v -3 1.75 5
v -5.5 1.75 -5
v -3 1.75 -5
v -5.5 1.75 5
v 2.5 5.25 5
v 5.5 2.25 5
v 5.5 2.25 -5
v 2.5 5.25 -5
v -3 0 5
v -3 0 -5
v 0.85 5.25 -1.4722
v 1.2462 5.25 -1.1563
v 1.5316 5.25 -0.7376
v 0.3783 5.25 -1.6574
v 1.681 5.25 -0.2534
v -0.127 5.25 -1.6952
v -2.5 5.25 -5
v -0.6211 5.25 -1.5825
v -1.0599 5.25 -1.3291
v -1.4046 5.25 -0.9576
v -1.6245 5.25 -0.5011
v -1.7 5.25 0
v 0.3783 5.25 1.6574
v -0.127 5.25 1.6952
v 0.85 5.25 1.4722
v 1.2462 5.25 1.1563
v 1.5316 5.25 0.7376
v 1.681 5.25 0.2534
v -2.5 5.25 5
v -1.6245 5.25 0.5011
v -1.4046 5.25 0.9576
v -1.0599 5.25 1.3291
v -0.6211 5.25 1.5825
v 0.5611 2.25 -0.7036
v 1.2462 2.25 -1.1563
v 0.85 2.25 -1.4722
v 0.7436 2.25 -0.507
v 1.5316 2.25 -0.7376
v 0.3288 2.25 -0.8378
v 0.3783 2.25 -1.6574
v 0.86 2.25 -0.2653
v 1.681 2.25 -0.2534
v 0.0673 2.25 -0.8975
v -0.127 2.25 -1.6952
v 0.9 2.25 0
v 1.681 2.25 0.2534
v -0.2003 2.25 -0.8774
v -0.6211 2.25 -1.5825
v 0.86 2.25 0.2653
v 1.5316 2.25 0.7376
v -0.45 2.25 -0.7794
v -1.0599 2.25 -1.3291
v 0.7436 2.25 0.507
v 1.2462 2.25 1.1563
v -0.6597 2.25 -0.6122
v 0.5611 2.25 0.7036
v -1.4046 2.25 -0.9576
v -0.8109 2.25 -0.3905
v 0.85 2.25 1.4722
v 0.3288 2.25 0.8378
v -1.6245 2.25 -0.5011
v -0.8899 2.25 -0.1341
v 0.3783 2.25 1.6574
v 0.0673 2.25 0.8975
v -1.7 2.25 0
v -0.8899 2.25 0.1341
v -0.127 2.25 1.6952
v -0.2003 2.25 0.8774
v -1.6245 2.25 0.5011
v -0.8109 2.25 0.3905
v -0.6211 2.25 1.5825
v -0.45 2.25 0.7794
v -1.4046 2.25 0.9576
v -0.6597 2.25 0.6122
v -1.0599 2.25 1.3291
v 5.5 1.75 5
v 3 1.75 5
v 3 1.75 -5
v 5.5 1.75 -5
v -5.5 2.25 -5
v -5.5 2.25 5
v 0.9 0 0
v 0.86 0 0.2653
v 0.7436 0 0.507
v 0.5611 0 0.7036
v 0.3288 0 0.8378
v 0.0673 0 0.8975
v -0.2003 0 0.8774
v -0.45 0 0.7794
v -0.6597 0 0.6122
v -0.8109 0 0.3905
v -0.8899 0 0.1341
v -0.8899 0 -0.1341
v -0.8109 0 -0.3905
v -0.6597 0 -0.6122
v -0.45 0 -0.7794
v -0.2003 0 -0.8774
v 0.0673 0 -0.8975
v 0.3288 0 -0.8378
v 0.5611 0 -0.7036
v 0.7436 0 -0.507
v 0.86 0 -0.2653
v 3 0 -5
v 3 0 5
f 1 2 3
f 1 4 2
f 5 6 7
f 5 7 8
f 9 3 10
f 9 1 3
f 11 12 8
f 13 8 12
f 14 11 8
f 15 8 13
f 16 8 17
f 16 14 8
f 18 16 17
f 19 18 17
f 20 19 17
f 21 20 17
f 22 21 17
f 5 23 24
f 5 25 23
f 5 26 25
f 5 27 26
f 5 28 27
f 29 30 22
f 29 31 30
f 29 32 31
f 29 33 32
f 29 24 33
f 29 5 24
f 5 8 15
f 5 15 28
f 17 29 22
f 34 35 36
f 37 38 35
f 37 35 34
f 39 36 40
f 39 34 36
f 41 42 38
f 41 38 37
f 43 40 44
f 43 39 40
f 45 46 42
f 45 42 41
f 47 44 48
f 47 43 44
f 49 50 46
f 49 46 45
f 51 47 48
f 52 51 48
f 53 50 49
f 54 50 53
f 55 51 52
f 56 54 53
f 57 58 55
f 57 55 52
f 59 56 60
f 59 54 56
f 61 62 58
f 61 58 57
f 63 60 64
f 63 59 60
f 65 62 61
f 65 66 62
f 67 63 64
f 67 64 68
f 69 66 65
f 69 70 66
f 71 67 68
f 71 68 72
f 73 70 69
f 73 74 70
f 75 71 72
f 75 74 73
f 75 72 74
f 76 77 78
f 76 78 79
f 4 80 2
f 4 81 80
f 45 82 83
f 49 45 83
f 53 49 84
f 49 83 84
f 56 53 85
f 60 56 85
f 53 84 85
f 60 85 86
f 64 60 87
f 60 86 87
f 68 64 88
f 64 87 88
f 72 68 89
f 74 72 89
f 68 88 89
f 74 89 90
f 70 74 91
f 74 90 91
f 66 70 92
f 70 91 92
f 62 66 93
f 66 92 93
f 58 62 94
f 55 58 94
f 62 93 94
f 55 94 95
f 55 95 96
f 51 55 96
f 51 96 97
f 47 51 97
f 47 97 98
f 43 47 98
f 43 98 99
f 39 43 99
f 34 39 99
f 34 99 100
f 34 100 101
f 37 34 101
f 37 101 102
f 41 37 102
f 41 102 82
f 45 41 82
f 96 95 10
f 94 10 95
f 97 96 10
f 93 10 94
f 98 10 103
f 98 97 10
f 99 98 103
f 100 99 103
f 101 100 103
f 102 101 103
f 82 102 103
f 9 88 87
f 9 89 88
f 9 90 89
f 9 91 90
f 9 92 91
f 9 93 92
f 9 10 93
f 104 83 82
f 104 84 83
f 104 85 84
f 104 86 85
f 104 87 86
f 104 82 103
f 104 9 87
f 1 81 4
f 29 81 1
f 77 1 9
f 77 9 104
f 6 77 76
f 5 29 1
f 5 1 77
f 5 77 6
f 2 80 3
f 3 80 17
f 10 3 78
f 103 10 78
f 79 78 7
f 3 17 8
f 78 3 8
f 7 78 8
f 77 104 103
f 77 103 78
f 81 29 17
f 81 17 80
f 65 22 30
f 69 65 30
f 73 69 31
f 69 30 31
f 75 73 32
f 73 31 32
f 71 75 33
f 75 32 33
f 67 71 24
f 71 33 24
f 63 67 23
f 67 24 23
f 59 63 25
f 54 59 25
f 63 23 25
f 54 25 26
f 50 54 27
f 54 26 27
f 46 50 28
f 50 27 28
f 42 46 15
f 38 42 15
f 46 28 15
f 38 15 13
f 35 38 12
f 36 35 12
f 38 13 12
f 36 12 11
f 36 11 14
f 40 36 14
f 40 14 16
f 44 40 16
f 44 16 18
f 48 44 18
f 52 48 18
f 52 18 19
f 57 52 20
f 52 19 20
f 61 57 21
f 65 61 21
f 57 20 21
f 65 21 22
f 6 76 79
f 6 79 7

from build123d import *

# Parameters (mm, degrees)
F1_DEPTH = 5
F2_R     = 0.9
F3_DEPTH = 5.25
F4_R     = 1.7
F5_DEPTH = 3


with BuildPart() as f1:
    # F0 (on Top) → F1 (new body, symmetric)
    with BuildSketch(Plane.XY):
        Polygon((-3, 1.75), (-3, 0), (3, 0), (3, 1.75), (5.5, 1.75), (5.5, 2.25), (2.5, 5.25), (-2.5, 5.25), (-5.5, 2.25), (-5.5, 1.75), align=None)
    extrude(amount=F1_DEPTH, both=True)

    # F2 (on face) → F3 (cut, through all)
    with BuildSketch(Plane.XZ):
        Circle(F2_R)
    extrude(amount=-F3_DEPTH, mode=Mode.SUBTRACT)

    # F4 (on face) → F5 (cut)
    with BuildSketch(Plane(origin=(0, 5.25, 0), x_dir=(-1, 0, 0), z_dir=(0, 1, 0))):
        Circle(F4_R)
    extrude(amount=-F5_DEPTH, mode=Mode.SUBTRACT)


solid = f1.part
